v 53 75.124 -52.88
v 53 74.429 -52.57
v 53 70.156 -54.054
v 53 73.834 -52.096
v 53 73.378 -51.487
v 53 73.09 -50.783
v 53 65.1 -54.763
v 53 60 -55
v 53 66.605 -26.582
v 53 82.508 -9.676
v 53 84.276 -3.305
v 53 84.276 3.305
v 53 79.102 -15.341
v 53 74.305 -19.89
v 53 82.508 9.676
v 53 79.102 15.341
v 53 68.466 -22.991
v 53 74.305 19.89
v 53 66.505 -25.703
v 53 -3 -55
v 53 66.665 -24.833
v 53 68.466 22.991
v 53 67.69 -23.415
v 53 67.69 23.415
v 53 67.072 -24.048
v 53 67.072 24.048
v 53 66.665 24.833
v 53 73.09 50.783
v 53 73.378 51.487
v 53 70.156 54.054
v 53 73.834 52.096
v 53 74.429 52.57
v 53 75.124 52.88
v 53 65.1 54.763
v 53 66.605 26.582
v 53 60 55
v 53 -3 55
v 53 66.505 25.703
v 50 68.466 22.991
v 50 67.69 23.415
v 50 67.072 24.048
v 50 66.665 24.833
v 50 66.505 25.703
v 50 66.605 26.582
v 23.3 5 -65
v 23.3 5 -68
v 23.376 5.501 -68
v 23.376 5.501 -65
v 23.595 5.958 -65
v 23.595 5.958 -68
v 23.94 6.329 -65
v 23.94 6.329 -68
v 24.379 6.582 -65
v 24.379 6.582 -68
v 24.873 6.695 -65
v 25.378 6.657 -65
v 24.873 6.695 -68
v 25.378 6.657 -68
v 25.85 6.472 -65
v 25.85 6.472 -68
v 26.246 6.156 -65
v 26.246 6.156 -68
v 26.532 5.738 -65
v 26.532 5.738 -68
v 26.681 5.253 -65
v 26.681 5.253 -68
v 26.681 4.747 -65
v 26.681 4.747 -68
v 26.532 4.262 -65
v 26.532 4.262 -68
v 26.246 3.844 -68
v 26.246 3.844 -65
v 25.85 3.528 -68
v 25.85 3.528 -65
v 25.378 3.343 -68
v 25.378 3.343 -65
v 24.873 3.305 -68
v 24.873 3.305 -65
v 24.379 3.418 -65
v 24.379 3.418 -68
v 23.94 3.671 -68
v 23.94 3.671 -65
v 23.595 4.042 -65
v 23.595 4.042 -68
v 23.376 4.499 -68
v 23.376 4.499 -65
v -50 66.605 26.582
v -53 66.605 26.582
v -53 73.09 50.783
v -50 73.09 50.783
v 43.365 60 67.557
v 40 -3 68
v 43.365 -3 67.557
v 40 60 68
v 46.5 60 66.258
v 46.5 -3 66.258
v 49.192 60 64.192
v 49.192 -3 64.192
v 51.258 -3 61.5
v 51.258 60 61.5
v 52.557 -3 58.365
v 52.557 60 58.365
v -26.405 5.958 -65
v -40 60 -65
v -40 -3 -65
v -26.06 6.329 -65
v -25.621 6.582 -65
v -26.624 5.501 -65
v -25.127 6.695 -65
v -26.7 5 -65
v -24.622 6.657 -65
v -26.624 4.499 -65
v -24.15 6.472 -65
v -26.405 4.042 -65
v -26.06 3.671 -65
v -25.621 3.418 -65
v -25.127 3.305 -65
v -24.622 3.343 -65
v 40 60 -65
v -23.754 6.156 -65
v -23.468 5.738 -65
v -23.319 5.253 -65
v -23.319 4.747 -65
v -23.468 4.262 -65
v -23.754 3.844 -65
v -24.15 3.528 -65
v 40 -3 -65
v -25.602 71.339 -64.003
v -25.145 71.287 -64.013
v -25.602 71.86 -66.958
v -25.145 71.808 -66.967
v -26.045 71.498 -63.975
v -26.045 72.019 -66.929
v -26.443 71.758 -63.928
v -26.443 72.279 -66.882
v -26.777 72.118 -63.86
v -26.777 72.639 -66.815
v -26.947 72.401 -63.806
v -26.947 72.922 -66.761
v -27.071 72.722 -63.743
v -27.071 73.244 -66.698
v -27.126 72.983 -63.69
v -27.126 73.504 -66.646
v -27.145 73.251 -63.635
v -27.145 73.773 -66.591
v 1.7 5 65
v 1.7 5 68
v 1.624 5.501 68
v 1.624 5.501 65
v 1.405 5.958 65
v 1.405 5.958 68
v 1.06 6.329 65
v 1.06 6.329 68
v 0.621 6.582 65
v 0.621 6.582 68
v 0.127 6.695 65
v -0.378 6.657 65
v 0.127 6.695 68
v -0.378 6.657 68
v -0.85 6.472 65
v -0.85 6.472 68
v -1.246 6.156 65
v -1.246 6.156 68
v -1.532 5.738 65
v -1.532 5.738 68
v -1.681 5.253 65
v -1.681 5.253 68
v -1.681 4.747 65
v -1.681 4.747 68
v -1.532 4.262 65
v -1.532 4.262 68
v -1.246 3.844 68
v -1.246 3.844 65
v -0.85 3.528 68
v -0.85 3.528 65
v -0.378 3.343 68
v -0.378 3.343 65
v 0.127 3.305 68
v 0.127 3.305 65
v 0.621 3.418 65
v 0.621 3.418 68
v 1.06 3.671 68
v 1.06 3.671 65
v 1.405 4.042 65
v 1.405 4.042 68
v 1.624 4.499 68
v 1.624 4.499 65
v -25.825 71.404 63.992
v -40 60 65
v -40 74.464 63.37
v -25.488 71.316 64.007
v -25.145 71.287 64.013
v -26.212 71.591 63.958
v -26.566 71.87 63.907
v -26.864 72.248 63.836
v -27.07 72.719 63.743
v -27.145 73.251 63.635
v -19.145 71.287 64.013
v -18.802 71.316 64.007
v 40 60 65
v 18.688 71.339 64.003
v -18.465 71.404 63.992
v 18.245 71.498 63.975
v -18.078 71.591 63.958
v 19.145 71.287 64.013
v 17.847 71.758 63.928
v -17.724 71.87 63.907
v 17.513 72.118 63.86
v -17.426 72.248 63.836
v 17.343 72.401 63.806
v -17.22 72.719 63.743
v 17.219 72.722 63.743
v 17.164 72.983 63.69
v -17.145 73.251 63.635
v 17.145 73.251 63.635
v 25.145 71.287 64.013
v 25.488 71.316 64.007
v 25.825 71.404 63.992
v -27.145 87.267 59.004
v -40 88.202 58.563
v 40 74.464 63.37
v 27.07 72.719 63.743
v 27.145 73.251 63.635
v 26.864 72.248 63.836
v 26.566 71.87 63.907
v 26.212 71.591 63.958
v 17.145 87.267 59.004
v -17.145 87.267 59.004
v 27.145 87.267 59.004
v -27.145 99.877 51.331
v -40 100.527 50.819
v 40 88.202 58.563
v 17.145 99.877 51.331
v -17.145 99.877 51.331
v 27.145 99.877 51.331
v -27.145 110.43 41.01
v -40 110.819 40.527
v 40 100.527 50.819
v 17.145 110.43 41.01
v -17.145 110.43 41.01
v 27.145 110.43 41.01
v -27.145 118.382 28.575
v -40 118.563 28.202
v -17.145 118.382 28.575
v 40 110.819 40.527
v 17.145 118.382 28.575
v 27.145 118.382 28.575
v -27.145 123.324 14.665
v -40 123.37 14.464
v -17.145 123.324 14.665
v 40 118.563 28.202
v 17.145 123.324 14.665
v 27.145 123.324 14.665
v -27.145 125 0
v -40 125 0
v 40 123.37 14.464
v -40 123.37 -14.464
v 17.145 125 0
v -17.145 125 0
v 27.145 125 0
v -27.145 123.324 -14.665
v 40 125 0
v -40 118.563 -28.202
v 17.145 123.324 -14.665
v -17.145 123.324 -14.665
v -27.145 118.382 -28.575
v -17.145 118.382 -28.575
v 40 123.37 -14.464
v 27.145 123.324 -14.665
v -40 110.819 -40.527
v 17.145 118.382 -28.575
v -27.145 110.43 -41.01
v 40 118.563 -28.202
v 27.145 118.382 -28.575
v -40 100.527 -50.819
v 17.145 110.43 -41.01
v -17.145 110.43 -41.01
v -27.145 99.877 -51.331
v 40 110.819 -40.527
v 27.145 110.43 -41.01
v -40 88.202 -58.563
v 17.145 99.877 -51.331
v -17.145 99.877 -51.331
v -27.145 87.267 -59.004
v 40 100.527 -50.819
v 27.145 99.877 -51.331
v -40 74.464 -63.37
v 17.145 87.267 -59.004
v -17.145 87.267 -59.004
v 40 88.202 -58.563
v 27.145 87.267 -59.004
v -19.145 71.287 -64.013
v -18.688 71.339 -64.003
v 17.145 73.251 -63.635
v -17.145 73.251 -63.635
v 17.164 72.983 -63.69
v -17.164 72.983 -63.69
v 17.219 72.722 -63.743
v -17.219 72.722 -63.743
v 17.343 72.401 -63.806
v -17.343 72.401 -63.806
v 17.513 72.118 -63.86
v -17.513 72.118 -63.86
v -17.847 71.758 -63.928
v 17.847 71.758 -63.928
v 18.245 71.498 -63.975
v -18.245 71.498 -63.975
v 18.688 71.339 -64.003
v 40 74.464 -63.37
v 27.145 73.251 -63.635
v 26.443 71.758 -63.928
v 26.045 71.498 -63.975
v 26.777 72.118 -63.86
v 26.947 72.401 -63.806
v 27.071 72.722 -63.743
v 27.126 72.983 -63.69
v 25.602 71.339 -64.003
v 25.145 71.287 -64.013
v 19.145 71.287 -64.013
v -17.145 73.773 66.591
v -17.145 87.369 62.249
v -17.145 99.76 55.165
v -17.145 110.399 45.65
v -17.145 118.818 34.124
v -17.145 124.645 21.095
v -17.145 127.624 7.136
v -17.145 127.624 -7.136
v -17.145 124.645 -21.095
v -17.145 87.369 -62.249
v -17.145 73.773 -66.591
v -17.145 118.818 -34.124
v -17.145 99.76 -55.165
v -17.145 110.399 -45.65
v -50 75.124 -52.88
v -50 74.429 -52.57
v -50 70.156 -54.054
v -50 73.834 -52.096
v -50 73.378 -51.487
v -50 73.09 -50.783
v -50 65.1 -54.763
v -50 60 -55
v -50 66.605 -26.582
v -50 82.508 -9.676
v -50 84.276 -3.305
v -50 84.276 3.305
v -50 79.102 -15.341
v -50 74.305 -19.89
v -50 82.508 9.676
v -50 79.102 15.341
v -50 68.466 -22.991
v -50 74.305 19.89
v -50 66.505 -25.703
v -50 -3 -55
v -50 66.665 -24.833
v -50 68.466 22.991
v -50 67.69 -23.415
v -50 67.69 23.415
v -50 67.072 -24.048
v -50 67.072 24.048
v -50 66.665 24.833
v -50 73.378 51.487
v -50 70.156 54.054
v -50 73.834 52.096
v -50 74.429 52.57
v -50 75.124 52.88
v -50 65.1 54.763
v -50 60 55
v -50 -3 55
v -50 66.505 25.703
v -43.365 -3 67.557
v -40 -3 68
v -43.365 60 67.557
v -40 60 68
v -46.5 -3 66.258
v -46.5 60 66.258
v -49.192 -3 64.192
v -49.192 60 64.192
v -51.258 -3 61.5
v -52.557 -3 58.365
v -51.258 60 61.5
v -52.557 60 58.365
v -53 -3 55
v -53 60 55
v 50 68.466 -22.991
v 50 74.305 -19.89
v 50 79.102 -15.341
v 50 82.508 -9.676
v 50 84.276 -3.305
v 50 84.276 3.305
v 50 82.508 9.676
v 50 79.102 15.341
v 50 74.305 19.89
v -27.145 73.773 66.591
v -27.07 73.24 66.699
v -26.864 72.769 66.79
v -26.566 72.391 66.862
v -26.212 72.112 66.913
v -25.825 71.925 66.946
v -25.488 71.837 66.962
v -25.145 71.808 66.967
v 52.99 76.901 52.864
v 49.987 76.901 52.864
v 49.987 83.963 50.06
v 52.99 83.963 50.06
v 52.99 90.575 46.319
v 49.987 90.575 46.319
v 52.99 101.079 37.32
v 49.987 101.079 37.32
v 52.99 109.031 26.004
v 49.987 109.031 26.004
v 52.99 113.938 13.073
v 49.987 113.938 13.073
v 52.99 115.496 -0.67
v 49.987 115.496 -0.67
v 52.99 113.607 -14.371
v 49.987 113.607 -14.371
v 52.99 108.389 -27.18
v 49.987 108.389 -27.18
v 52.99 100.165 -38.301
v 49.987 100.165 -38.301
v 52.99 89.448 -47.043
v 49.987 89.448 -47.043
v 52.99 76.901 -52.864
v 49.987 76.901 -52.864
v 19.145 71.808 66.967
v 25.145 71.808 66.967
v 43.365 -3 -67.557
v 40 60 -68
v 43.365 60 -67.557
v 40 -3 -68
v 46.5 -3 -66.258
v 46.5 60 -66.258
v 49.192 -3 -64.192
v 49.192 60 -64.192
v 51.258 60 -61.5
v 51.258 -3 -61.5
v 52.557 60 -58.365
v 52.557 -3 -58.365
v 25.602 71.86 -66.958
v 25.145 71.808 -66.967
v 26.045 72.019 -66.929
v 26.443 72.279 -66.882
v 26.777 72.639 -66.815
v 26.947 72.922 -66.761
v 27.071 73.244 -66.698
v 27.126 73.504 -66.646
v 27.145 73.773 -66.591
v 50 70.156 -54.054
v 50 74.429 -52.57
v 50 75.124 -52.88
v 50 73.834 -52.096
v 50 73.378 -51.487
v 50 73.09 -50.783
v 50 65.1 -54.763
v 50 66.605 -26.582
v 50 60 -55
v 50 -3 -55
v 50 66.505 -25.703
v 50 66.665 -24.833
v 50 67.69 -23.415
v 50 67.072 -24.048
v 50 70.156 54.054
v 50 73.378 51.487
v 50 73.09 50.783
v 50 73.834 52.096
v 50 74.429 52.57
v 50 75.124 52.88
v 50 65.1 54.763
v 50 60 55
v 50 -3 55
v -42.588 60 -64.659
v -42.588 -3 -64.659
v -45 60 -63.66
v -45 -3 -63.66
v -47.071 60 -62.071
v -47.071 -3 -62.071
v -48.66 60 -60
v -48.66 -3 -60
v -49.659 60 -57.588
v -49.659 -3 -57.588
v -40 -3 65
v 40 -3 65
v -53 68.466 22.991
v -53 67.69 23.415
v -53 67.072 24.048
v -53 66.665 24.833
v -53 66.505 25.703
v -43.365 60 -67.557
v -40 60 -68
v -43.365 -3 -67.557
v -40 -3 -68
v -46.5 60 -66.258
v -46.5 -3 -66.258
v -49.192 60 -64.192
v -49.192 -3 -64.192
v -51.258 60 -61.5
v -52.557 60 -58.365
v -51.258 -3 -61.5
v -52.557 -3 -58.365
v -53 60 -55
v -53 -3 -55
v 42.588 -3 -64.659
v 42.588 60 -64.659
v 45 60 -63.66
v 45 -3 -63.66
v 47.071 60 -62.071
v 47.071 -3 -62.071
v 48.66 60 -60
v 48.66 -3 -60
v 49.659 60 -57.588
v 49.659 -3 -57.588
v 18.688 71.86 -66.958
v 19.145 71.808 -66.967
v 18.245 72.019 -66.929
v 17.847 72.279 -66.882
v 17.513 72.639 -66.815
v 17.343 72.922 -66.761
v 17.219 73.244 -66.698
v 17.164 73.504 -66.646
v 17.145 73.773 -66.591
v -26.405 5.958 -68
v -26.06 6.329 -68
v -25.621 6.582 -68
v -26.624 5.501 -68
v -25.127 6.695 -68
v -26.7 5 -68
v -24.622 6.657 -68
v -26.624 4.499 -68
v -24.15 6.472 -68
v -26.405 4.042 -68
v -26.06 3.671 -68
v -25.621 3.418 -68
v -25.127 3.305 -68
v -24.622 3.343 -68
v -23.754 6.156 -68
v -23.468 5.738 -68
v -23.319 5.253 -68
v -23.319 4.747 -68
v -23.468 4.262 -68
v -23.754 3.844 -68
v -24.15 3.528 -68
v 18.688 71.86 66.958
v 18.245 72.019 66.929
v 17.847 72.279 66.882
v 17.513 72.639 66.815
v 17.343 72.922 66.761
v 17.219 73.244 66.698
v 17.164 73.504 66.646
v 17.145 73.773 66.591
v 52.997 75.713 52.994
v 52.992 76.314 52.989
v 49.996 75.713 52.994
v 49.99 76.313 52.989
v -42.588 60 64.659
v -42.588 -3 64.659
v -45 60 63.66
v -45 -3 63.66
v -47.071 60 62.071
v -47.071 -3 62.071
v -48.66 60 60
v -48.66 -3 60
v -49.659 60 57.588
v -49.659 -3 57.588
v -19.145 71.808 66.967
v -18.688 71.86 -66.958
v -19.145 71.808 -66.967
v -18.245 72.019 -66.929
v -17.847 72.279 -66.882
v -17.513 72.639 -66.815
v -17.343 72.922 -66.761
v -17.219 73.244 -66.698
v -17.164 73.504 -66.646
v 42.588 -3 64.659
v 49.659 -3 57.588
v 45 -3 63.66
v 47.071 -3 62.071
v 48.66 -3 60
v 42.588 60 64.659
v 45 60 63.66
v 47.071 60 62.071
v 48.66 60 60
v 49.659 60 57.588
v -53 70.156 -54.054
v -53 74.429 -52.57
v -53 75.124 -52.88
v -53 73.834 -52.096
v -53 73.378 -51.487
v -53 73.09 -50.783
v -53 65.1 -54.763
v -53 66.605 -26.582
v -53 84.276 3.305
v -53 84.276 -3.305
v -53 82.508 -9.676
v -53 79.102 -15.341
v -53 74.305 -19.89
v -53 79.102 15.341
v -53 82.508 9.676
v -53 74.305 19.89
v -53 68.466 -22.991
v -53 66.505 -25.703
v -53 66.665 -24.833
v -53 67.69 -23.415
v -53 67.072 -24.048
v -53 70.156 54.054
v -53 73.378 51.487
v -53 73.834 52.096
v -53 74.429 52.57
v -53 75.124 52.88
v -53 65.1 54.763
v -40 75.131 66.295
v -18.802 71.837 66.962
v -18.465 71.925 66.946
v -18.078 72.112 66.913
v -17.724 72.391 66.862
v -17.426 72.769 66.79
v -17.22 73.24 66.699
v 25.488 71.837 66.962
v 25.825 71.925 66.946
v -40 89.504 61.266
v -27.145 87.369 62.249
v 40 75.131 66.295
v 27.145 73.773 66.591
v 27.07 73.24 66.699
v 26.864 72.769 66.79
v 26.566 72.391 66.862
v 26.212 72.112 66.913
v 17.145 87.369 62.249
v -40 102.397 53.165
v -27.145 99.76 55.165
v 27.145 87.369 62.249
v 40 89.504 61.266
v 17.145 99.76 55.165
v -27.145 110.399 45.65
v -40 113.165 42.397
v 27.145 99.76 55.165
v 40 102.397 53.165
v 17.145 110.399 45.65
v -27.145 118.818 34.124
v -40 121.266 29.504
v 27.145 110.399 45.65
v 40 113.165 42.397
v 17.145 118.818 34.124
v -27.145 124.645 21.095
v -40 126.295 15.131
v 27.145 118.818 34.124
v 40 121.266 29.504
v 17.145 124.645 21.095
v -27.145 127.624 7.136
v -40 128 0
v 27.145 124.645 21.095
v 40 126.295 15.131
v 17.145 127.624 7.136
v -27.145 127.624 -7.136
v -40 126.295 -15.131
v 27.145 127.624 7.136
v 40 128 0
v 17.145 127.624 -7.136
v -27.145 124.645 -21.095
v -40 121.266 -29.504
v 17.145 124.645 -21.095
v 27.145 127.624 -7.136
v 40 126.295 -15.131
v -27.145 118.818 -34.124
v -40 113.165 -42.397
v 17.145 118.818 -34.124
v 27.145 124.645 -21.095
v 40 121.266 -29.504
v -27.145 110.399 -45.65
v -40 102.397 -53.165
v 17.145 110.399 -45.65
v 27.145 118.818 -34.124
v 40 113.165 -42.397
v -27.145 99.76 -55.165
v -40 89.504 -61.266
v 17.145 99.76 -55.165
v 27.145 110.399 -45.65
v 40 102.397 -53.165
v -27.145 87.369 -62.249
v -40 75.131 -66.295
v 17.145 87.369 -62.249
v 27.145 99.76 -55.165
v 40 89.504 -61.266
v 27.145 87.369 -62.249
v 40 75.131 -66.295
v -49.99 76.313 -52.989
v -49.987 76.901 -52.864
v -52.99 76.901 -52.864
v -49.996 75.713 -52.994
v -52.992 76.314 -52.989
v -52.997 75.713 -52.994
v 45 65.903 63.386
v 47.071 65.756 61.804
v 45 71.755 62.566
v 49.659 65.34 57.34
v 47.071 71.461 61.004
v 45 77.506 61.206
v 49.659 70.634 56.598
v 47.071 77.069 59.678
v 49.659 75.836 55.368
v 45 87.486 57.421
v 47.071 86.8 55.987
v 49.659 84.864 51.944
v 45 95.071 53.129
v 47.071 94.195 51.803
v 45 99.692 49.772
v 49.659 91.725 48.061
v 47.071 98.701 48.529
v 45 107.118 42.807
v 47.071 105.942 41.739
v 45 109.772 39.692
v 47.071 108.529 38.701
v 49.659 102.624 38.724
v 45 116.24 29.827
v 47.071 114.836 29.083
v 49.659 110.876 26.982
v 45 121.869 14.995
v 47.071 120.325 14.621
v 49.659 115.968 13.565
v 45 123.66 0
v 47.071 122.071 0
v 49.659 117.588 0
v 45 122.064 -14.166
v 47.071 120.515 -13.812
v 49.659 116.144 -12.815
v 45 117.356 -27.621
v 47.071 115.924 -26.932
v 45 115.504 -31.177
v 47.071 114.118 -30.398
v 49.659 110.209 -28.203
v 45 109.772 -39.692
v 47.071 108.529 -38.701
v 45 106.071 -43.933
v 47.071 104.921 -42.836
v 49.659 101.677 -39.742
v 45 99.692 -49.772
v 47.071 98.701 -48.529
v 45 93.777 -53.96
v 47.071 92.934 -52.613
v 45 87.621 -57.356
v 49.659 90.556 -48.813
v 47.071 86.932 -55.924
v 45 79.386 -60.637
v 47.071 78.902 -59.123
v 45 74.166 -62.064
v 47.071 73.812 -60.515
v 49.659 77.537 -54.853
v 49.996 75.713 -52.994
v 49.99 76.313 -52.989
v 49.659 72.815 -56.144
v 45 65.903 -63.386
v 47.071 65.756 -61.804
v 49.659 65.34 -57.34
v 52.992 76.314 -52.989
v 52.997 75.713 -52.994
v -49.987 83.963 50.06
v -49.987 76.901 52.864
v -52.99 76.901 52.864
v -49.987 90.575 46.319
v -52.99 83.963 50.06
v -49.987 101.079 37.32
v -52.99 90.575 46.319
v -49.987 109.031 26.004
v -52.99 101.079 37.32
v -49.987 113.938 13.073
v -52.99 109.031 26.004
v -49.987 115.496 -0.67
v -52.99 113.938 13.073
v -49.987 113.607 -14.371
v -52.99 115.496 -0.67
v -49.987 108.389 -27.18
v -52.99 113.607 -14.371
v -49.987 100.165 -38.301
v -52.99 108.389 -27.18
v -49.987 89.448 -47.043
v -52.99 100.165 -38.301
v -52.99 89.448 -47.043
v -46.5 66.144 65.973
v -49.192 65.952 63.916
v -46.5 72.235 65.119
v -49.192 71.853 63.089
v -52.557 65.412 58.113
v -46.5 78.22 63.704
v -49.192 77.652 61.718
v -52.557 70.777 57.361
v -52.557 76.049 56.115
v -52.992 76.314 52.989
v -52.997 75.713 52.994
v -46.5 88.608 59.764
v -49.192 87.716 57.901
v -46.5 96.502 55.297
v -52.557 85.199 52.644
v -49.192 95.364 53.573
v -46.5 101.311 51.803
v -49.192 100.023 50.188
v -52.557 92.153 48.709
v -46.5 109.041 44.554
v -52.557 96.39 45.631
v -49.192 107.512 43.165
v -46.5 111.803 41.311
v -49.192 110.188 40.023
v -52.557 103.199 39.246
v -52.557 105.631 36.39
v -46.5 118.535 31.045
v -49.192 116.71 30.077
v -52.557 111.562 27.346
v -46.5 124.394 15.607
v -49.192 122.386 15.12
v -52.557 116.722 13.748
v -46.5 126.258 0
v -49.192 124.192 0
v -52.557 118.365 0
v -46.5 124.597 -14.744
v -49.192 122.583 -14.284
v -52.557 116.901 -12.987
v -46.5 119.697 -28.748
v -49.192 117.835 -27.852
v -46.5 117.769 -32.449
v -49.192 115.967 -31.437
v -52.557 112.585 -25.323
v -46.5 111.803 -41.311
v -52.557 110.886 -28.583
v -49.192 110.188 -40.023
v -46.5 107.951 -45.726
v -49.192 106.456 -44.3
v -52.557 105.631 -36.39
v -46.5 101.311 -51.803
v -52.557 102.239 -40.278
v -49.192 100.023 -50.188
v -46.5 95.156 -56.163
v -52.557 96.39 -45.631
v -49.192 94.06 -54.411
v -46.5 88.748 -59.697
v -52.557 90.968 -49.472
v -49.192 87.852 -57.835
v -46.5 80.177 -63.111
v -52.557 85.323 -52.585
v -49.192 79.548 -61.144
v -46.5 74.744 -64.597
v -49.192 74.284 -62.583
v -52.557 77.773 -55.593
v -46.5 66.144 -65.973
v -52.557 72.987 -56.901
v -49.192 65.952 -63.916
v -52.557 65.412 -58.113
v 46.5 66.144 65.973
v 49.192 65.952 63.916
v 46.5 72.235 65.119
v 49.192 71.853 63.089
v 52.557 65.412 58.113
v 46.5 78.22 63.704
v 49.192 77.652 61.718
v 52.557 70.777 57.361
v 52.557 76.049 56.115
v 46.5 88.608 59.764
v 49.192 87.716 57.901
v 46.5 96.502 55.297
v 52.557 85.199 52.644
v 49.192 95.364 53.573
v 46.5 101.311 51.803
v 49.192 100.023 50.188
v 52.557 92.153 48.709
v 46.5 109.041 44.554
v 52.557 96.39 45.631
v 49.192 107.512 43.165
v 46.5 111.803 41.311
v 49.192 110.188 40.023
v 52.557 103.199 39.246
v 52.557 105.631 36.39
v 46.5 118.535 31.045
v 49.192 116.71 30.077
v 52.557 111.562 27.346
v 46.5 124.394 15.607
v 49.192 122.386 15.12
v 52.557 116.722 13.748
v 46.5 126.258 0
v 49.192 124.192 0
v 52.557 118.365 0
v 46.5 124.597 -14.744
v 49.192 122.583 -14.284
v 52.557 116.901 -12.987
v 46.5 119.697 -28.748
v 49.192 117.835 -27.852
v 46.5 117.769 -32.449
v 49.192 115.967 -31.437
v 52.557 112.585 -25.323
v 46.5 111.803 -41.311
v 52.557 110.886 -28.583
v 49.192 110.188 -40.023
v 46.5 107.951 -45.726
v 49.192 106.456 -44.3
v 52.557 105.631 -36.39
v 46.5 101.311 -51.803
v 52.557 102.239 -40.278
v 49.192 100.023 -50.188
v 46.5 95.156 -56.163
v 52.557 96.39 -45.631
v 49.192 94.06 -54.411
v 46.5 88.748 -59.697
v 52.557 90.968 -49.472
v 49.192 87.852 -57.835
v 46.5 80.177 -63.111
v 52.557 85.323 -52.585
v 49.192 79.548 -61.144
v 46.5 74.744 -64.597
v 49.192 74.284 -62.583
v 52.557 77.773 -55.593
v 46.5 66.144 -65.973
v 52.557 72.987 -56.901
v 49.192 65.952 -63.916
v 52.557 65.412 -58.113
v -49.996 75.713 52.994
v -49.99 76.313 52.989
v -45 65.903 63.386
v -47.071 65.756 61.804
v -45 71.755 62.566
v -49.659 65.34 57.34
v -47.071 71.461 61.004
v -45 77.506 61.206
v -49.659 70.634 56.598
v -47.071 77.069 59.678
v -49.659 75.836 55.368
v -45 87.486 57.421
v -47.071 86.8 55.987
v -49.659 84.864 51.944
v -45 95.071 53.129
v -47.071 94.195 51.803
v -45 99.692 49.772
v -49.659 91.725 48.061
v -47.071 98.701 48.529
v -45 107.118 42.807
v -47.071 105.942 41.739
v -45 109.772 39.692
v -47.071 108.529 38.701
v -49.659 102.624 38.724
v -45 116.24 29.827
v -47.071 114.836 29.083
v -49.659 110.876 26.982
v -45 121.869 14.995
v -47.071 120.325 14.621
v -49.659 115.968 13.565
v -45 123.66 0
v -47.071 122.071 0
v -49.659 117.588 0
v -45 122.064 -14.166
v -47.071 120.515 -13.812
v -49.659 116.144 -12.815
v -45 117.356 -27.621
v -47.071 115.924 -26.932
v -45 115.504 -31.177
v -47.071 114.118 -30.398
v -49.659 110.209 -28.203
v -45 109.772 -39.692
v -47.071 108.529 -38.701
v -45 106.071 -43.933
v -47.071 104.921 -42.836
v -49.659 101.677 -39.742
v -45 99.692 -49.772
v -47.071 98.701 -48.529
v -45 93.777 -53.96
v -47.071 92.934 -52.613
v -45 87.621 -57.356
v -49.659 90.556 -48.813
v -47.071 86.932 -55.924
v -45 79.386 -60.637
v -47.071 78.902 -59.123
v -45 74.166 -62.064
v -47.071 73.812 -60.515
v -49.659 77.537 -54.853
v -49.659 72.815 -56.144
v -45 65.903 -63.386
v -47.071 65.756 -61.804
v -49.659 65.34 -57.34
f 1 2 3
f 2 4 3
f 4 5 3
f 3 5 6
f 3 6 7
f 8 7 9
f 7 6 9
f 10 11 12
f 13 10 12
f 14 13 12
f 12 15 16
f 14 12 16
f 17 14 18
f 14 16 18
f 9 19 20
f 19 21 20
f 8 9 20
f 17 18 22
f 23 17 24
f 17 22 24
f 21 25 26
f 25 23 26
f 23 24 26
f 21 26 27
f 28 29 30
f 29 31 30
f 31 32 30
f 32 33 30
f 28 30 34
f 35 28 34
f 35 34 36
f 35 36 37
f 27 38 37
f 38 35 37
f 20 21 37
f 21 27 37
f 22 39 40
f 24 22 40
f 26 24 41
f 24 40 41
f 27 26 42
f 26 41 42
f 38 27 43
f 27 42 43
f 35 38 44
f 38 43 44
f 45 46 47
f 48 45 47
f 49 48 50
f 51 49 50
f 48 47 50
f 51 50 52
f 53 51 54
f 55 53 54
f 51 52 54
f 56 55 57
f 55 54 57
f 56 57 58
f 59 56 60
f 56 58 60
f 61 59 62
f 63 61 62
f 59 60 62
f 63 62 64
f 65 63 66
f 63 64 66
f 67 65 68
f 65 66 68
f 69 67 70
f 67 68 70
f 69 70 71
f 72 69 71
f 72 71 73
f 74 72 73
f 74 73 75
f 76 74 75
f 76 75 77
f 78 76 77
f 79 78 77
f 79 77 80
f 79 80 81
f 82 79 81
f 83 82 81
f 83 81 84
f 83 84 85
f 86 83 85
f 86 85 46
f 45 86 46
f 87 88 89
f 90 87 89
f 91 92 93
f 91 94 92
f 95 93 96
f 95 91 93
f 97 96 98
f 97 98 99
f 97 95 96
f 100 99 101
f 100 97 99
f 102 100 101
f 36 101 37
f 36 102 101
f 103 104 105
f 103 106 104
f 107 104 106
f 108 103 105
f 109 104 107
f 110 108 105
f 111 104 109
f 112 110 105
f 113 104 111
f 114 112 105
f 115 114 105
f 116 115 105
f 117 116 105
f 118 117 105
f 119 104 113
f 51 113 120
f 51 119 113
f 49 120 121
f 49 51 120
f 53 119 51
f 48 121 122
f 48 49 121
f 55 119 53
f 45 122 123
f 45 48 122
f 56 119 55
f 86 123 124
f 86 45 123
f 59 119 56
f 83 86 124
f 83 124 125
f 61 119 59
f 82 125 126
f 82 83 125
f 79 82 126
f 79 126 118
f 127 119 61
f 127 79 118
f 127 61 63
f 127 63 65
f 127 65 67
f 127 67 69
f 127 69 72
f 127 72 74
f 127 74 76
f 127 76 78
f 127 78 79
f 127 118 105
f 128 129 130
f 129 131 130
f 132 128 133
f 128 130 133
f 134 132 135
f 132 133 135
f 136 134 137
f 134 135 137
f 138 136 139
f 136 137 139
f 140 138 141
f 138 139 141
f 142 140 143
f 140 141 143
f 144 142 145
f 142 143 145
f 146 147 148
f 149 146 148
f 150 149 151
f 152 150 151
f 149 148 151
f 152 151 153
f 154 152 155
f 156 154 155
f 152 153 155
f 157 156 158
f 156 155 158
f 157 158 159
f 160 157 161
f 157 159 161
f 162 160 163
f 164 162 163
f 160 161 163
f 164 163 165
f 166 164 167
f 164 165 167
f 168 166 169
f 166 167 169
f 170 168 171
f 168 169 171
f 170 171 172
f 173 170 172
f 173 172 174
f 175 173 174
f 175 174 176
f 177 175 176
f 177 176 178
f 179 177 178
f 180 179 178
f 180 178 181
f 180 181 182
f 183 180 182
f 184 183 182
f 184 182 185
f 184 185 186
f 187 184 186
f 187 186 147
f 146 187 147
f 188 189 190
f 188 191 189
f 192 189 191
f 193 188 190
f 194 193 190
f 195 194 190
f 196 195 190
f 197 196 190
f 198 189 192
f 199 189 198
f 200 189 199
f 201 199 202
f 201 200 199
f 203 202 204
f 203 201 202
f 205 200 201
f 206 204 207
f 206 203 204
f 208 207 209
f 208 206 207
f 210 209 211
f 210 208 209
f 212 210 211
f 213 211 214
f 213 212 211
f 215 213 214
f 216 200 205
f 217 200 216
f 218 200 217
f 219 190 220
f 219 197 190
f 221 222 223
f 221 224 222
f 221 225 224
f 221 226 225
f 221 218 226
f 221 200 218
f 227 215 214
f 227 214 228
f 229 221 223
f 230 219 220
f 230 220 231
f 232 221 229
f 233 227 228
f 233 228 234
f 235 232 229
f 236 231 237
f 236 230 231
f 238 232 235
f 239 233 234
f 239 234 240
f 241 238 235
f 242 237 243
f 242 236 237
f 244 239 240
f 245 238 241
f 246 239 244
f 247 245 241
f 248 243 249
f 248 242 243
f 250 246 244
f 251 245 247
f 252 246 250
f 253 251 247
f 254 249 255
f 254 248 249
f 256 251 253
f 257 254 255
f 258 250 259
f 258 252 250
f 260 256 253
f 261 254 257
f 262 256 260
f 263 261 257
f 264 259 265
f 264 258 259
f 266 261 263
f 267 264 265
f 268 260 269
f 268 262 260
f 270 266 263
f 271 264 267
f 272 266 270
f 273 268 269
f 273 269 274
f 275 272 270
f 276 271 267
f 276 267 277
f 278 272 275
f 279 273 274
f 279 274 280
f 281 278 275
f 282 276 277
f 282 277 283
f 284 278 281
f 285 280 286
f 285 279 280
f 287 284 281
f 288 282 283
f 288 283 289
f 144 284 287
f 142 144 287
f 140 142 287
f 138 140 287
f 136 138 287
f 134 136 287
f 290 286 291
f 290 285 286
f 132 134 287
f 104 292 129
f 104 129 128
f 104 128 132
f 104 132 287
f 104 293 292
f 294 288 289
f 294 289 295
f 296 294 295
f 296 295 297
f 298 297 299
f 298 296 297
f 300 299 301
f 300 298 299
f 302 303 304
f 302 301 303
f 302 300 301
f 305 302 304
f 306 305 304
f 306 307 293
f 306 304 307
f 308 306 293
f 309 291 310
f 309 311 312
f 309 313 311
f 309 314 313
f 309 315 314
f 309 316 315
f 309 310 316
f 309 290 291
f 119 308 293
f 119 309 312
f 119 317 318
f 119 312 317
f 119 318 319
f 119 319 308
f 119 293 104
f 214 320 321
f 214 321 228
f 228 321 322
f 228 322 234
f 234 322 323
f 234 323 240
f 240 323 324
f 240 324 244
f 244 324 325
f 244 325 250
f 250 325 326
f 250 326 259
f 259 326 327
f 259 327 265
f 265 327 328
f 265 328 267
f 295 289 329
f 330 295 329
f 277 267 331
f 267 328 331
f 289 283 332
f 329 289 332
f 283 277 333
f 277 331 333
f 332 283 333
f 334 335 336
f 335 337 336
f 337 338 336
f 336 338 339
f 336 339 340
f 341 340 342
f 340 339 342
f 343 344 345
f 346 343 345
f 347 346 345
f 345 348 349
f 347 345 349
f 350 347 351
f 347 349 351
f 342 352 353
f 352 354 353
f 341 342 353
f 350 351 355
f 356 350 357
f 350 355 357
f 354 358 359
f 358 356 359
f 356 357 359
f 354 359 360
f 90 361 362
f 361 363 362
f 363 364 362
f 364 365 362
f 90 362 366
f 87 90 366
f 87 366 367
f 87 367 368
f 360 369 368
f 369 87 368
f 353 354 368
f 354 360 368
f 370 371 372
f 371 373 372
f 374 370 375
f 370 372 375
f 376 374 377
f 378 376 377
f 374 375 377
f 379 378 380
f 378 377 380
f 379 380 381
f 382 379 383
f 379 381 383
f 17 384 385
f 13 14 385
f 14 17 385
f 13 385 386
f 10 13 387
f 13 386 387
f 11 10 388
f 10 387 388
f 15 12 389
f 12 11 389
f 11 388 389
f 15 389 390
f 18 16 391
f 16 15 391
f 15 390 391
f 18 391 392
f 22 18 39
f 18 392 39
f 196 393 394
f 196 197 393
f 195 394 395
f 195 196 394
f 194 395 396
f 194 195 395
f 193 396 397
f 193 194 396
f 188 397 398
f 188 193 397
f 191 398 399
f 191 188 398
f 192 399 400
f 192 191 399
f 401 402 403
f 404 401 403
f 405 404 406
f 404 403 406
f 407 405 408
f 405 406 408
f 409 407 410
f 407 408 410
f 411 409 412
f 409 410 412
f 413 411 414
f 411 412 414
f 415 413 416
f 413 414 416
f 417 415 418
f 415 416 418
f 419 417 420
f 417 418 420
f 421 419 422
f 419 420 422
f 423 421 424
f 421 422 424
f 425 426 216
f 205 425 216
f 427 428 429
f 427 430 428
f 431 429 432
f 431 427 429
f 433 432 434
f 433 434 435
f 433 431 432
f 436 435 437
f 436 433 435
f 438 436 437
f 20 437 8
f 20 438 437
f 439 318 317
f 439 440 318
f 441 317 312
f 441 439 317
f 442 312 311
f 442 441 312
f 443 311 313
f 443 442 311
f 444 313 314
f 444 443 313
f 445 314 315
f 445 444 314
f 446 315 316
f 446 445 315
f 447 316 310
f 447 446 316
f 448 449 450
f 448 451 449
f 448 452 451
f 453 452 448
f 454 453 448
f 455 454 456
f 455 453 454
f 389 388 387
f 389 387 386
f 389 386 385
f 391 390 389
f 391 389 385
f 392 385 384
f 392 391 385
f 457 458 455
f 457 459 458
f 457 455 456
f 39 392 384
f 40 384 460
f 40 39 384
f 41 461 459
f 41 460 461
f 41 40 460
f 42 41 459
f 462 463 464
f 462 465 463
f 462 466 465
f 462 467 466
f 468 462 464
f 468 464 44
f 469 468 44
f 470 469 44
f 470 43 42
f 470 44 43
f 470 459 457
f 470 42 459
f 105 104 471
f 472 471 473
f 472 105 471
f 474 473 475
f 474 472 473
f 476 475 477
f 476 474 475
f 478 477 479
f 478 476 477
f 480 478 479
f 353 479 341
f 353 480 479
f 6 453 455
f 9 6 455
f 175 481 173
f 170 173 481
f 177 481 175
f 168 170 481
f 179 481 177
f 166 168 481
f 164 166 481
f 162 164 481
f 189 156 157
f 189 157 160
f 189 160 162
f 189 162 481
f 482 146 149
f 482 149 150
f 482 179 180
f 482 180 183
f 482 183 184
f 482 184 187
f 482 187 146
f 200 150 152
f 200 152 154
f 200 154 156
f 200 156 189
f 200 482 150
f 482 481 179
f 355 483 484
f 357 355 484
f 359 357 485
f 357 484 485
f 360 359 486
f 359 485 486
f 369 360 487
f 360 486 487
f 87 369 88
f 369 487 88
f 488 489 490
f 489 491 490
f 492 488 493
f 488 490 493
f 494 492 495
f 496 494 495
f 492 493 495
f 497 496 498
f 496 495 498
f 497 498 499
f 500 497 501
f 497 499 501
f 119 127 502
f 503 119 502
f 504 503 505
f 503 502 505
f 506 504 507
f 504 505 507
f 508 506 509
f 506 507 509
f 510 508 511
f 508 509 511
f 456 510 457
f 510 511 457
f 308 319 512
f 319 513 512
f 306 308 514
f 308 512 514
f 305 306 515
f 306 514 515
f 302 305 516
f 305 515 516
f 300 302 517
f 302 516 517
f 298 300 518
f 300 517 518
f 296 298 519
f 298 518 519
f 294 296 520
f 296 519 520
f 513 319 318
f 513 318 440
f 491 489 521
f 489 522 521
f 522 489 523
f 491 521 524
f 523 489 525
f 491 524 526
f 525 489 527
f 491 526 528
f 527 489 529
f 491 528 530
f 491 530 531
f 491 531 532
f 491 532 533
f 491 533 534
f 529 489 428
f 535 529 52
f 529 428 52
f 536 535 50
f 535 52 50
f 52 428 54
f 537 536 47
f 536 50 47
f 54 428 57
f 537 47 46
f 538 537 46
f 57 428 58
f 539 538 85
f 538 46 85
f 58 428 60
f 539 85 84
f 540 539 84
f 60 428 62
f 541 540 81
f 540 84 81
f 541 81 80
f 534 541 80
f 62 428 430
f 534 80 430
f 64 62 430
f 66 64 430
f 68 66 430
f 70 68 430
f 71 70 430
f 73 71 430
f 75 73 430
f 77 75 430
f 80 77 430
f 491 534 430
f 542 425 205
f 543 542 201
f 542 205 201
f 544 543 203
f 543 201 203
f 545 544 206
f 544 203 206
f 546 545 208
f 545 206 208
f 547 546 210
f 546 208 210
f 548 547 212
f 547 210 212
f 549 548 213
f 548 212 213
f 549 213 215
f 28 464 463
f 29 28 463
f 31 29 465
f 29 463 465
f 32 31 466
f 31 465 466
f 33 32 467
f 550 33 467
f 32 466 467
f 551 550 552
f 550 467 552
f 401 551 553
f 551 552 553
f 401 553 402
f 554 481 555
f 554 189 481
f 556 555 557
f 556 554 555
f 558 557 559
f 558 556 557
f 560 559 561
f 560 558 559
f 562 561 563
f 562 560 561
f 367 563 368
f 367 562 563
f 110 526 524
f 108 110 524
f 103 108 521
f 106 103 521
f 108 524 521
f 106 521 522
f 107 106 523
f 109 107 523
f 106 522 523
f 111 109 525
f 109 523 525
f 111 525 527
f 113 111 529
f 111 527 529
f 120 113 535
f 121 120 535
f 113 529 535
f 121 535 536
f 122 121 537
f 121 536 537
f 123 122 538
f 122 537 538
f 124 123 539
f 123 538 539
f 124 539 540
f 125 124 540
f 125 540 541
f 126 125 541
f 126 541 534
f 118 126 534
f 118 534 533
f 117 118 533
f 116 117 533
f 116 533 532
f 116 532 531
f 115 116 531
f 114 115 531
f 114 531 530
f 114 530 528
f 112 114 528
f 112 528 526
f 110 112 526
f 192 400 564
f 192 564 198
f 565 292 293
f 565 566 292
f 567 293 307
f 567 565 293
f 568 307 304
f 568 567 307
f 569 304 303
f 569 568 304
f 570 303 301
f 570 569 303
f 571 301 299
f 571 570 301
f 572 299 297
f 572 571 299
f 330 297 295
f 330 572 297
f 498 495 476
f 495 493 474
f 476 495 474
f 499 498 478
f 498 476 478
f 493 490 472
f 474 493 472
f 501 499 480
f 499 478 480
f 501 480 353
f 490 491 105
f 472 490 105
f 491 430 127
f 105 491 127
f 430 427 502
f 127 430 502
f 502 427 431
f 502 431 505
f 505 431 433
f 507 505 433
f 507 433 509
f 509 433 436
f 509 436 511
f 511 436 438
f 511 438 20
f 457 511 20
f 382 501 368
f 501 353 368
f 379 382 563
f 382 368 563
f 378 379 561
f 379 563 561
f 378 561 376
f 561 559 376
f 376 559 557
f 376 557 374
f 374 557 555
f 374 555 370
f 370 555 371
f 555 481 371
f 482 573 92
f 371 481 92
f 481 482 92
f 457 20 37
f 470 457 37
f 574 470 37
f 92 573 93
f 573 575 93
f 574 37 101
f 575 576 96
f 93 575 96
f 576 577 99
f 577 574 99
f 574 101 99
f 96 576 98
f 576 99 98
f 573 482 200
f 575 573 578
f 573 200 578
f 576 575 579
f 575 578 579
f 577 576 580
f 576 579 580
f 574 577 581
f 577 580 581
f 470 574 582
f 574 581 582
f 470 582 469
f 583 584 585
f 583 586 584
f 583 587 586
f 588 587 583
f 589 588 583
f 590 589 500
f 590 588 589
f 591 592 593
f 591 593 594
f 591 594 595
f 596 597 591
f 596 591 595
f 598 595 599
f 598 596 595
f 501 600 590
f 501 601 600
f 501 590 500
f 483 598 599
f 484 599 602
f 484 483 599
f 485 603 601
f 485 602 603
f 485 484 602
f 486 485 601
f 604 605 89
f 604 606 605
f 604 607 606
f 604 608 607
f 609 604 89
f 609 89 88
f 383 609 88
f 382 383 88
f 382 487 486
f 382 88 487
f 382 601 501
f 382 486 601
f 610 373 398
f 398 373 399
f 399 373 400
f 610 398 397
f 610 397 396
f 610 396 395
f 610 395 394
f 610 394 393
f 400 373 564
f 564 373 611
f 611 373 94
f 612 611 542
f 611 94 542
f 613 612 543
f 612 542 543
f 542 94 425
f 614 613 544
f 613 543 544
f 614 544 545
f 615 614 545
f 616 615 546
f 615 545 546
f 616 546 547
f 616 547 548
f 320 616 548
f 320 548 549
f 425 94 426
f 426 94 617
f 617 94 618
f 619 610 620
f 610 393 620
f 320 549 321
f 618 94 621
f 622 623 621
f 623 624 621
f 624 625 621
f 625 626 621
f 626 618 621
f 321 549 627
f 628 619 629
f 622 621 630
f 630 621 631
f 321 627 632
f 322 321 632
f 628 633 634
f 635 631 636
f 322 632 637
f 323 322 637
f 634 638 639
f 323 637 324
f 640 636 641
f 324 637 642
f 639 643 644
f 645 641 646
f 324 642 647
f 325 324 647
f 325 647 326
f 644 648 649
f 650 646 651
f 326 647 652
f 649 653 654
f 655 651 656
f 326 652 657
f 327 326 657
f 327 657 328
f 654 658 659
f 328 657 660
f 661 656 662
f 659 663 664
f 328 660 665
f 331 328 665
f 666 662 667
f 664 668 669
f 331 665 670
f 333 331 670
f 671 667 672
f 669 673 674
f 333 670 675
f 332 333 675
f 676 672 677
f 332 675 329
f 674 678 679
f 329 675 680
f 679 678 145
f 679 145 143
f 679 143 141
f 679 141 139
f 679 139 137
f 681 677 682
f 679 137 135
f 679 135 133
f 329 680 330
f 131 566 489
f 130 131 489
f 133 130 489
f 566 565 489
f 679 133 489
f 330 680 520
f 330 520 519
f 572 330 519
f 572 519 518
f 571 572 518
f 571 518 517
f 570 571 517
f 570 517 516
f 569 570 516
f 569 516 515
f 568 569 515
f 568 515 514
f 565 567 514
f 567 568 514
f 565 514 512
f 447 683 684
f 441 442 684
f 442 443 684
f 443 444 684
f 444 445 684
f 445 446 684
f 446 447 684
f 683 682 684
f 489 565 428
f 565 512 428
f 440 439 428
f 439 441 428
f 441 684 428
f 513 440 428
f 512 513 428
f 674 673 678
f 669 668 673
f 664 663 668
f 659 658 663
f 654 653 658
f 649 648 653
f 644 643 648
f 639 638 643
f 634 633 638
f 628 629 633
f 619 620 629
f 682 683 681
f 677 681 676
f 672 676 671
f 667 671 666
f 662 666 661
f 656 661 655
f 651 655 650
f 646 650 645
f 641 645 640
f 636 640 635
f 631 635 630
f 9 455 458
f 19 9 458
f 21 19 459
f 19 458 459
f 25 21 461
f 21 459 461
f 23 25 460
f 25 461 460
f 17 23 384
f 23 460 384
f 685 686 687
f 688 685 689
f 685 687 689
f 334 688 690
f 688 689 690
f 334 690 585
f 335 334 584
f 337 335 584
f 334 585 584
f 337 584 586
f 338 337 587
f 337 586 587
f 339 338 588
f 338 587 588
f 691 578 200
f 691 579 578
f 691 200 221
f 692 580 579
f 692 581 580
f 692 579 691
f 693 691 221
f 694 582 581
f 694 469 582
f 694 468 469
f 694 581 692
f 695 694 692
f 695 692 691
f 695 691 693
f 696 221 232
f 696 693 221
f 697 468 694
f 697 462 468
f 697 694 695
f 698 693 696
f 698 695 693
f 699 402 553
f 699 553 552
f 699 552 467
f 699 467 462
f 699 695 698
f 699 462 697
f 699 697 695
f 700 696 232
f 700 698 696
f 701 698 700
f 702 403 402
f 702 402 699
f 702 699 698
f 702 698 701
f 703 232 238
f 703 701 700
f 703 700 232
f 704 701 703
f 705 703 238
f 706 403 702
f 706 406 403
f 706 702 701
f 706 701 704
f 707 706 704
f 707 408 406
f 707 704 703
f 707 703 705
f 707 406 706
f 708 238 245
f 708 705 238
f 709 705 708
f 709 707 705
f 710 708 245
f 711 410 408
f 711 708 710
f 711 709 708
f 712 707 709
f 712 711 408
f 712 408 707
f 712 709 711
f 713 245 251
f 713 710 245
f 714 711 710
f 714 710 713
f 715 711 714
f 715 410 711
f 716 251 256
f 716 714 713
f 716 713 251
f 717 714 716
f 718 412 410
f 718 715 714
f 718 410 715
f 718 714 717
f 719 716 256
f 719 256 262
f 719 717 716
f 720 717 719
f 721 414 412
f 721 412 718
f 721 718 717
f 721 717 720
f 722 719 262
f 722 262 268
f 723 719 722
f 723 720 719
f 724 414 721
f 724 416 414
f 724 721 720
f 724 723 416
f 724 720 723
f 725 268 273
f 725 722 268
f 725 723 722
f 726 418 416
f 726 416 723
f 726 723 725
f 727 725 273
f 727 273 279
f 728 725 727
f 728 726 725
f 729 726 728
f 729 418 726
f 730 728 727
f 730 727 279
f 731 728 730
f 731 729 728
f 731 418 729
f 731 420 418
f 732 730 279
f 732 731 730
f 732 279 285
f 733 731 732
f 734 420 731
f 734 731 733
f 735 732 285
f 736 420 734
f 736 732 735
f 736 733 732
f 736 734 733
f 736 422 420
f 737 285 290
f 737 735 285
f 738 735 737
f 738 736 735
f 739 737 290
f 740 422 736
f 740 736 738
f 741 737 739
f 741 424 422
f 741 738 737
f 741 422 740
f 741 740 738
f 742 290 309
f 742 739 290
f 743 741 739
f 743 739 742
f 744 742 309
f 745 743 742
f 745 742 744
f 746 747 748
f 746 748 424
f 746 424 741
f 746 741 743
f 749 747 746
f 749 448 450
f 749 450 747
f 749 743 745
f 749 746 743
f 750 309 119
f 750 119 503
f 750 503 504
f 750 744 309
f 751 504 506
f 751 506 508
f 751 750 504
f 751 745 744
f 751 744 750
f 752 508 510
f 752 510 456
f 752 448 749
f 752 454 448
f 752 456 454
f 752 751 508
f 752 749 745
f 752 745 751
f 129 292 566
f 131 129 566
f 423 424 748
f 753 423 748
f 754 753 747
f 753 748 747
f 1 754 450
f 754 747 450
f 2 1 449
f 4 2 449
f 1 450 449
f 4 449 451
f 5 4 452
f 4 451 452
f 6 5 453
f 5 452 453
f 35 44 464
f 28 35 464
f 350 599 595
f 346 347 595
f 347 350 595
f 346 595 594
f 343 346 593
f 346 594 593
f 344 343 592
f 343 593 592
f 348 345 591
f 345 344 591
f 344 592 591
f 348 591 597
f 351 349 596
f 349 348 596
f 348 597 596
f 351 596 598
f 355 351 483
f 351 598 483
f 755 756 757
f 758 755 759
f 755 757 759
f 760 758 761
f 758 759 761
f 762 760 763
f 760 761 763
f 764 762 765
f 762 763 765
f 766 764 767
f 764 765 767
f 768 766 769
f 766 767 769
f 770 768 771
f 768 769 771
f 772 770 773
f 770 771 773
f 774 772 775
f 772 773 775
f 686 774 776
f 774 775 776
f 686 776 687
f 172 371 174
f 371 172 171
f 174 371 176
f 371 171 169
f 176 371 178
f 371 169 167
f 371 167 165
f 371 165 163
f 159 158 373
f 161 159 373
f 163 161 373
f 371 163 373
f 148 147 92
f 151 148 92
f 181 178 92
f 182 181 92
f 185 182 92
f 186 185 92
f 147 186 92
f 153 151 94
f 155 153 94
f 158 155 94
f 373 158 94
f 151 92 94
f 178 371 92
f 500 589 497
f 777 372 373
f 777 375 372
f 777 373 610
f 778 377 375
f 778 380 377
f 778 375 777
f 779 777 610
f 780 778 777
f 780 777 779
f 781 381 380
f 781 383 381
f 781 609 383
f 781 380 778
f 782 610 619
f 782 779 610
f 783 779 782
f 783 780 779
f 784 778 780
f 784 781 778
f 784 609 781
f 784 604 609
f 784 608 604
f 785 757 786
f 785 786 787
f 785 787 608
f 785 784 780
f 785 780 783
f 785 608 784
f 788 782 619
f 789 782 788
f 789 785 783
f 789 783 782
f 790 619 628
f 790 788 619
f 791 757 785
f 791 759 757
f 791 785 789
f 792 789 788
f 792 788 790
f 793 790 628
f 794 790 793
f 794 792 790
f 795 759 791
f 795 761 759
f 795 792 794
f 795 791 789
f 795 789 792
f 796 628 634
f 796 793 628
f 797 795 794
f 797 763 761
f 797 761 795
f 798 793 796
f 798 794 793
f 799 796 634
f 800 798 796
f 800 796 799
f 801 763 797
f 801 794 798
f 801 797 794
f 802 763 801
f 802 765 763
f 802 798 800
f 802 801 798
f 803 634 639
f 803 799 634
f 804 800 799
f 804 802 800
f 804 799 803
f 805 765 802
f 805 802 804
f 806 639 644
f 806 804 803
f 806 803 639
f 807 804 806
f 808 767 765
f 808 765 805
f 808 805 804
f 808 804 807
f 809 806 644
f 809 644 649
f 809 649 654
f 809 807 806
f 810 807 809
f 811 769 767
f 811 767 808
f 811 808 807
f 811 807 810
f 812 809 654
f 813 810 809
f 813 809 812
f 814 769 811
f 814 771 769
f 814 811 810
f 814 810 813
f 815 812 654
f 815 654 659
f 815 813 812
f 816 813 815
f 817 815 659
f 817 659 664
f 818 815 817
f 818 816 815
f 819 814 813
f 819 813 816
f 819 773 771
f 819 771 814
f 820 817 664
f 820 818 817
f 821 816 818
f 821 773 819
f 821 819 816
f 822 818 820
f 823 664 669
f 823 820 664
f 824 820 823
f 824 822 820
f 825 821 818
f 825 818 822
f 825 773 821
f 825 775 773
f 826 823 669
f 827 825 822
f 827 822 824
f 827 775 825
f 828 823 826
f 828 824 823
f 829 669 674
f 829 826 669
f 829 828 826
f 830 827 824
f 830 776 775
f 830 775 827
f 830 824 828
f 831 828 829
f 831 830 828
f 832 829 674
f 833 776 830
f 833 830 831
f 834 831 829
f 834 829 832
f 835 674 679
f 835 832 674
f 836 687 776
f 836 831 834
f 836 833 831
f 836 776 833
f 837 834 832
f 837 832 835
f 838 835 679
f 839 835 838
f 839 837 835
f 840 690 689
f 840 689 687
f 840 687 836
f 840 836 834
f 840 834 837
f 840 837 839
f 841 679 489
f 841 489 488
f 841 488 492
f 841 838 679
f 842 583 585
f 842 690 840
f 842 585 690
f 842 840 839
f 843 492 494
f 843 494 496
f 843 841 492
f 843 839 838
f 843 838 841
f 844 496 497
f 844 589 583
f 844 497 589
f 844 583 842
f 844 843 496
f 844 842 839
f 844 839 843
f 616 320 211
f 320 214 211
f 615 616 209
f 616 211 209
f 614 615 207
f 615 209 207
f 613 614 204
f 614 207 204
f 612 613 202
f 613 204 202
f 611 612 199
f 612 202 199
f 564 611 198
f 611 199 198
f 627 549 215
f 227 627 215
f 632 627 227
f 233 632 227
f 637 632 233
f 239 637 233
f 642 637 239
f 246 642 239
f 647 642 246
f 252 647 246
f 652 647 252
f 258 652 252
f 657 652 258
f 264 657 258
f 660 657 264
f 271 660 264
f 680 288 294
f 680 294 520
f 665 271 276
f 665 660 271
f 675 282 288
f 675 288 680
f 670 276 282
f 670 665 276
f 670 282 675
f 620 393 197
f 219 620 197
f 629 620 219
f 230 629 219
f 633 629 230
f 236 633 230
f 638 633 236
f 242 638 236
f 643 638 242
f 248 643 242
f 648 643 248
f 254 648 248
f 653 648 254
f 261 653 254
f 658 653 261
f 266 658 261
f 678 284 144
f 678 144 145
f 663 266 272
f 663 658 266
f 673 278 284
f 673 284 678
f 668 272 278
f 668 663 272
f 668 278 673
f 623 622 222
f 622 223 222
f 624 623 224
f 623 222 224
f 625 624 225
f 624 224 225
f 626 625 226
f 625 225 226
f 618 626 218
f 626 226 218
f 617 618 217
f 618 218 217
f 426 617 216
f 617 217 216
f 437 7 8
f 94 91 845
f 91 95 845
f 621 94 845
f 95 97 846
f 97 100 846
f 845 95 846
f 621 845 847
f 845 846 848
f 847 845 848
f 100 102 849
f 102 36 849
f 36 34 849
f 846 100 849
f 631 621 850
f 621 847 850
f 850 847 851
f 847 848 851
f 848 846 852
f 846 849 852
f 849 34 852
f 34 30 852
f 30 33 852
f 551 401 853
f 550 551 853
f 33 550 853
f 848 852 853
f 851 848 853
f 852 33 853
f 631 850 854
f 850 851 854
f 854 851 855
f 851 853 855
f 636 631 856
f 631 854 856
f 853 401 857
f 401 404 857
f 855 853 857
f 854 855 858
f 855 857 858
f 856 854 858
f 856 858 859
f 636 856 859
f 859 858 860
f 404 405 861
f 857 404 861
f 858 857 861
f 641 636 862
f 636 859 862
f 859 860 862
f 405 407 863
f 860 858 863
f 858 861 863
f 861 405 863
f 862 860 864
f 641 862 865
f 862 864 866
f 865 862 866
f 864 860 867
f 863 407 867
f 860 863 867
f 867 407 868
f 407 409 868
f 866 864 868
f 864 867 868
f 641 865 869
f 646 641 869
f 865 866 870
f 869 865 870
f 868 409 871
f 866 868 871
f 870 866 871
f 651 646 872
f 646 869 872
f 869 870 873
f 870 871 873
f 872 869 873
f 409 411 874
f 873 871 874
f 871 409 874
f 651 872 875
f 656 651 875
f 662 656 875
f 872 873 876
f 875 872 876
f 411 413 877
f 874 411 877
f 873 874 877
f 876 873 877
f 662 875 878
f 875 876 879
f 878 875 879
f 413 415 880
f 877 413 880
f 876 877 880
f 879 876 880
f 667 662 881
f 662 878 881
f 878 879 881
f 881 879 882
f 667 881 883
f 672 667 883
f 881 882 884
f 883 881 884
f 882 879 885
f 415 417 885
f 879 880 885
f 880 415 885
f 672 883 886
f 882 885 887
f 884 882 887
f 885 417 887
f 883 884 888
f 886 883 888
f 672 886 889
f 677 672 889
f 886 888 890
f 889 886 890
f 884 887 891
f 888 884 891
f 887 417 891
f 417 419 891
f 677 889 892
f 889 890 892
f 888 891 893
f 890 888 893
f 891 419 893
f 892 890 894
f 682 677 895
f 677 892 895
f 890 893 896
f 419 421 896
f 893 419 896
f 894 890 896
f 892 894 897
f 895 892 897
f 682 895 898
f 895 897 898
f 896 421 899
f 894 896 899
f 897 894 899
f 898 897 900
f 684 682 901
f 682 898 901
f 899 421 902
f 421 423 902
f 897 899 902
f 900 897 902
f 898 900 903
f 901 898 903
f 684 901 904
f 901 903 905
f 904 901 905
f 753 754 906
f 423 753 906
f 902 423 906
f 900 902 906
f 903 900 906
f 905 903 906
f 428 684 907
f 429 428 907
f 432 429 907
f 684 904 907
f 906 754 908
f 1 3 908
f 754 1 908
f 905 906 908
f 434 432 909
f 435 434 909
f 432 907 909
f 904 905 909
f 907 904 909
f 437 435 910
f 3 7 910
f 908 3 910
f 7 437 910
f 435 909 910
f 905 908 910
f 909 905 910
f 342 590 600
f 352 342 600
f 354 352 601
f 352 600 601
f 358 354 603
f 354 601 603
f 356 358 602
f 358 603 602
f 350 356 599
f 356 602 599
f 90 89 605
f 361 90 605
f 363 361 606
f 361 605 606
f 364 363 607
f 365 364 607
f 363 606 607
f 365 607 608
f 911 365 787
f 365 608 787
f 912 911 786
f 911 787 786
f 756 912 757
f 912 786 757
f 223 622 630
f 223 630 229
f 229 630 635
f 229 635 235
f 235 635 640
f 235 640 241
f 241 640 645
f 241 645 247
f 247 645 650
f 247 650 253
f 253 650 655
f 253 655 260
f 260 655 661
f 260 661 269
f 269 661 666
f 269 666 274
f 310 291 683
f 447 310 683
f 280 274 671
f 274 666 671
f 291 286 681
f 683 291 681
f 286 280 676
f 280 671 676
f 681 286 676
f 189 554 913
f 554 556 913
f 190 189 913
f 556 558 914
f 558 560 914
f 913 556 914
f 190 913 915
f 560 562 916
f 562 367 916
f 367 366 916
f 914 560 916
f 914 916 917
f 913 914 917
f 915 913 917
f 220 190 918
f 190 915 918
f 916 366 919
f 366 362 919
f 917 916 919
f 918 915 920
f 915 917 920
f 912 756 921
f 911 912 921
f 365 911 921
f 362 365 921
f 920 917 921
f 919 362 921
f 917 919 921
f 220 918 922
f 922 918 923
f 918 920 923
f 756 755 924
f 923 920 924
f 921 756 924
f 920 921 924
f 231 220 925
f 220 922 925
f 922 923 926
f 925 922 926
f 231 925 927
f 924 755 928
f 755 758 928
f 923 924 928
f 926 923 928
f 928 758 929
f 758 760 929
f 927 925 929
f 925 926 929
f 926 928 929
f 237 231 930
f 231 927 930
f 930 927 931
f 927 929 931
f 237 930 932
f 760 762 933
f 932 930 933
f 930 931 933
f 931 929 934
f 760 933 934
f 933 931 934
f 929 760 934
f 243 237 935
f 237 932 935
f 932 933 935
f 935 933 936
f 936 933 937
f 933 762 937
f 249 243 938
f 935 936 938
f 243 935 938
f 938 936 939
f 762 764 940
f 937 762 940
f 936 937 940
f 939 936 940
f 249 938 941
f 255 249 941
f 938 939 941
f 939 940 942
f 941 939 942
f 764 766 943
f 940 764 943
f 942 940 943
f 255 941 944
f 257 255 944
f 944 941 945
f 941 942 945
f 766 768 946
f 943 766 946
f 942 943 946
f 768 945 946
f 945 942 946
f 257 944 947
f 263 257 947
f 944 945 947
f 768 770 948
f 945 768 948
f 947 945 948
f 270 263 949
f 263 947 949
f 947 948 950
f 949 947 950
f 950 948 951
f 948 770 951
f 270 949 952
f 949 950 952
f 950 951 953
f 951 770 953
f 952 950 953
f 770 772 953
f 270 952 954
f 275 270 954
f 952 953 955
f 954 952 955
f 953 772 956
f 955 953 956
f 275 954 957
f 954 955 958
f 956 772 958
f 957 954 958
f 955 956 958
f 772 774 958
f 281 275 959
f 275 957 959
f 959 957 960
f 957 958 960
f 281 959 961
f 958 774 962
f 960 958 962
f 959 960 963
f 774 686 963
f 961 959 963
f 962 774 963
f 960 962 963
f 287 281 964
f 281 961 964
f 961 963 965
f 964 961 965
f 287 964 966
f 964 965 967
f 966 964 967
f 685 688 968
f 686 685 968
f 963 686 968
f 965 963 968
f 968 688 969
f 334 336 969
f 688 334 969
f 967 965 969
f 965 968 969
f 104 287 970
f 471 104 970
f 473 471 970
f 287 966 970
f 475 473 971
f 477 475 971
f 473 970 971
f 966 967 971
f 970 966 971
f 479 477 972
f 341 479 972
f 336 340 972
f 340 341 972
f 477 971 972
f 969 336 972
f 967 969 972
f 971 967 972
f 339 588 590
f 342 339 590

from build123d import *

# Parameters (mm, degrees)
BOSS_EXTRUDE1_DEPTH      = 53
BOSS_EXTRUDE1_DEPTH_BACK = 53
FILLET1_R                = 13
SHELL1_T                 = -3
CUT_EXTRUDE1_DEPTH       = 155.32757377
CUT_EXTRUDE1_DEPTH_BACK  = 155.32757377
CUT_EXTRUDE2_START       = -22.145
CUT_EXTRUDE2_DEPTH       = 5
FILLET2_R                = 2
SKETCH4_R                = 1.7
CUT_EXTRUDE3_DEPTH       = 10
SKETCH5_R                = 1.7
CUT_EXTRUDE6_DEPTH       = 10


with BuildPart() as part:
    # Sketch1 → Boss-Extrude1 (new, two sides: drawn at the far end of the back side and taken through both)
    with BuildSketch(Plane(origin=(0, -21.232774713, 56.11), x_dir=(0, -1, 0), z_dir=(-1, 0, 0)).offset(-BOSS_EXTRUDE1_DEPTH_BACK)):
        with BuildLine():
            Line((-18.232774713, -124.11), (-18.232774713, 11.89))
            Line((-18.232774713, 11.89), (-81.232774713, 11.89))
            ThreePointArc((-81.232774713, 11.89), (-149.232774713, -56.11), (-81.232774713, -124.11))
            Line((-81.232774713, -124.11), (-18.232774713, -124.11))
        make_face()
    extrude(amount=BOSS_EXTRUDE1_DEPTH + BOSS_EXTRUDE1_DEPTH_BACK)

    # Fillet1
    fillet1_edges = [part.edges().sort_by_distance(p)[0] for p in [
        (53, 28.5, 68),
        (53, 128, 0),
        (53, 28.5, -68),
        (-53, 28.5, 68),
        (-53, 28.5, -68),
        (-53, 128, 0),
    ]]
    fillet(fillet1_edges, radius=FILLET1_R)

    # Shell1
    shell1_openings = [part.faces().sort_by_distance(p)[0] for p in [
        (0, -3, 0),
    ]]
    offset(amount=SHELL1_T, openings=shell1_openings, kind=Kind.INTERSECTION)

    # Sketch2 → Cut-Extrude1 (cut, two sides: drawn at the far end of the back side and taken through both)
    with BuildSketch(Plane(origin=(0, 0, 0), x_dir=(0, 0, -1), z_dir=(1, 0, 0)).offset(-CUT_EXTRUDE1_DEPTH_BACK)):
        with BuildLine():
            Line((-26.582377719, 66.605088553), (-50.782987187, 73.089622316))
            ThreePointArc((-50.782987187, 73.089622316), (-52.639593743, 74.549701775), (-52.864046055, 76.900965497))
            ThreePointArc((-52.864046055, 76.900965497), (0, 115.5), (52.864046055, 76.900965497))
            ThreePointArc((52.864046055, 76.900965497), (52.639593743, 74.549701775), (50.782987187, 73.089622316))
            Line((50.782987187, 73.089622316), (26.582377719, 66.605088553))
            ThreePointArc((26.582377719, 66.605088553), (24.425691005, 66.839228235), (22.990729248, 68.466189737))
            ThreePointArc((22.990729248, 68.466189737), (0, 84.5), (-22.990729248, 68.466189737))
            ThreePointArc((-22.990729248, 68.466189737), (-24.425691005, 66.839228235), (-26.582377719, 66.605088553))
        make_face()
    extrude(amount=CUT_EXTRUDE1_DEPTH + CUT_EXTRUDE1_DEPTH_BACK, mode=Mode.SUBTRACT)

    # Sketch3 → Cut-Extrude2 (cut, symmetric)
    with BuildSketch(Plane(origin=(0, 0, 0), x_dir=(0, 0, -1), z_dir=(1, 0, 0)).offset(CUT_EXTRUDE2_START)):
        with BuildLine():
            Line((0, 60), (98.480775301, 77.364817767))
            ThreePointArc((98.480775301, 77.364817767), (0, 160), (-98.480775301, 77.364817767))
            Line((-98.480775301, 77.364817767), (0, 60))
        make_face()
    cut_extrude2 = extrude(amount=CUT_EXTRUDE2_DEPTH, both=True, mode=Mode.SUBTRACT)

    # Mirror1: Cut-Extrude2 across plane
    add(cut_extrude2.mirror(Plane(origin=(0, 0, 0), x_dir=(0, 0, 1), z_dir=(1, 0, 0))), mode=Mode.SUBTRACT)

    # Fillet2
    fillet2_edges = [part.edges().sort_by_distance(p)[0] for p in [
        (-17.145, 71.547603815, 65.489715575),
        (-17.145, 71.547603815, -65.489715575),
        (-27.145, 71.547603815, -65.489715575),
        (-27.145, 71.547603815, 65.489715575),
        (27.145, 71.547603815, 65.489715575),
        (27.145, 71.547603815, -65.489715575),
        (17.145, 71.547603815, -65.489715575),
        (17.145, 71.547603815, 65.489715575),
    ]]
    fillet(fillet2_edges, radius=FILLET2_R)

    # Sketch4 → Cut-Extrude3 (cut)
    with BuildSketch(Plane.XY.offset(68)):
        with Locations((0, 5)):
            Circle(SKETCH4_R)
    extrude(amount=-CUT_EXTRUDE3_DEPTH, mode=Mode.SUBTRACT)

    # Sketch5 → Cut-Extrude6 (cut)
    with BuildSketch(Plane(origin=(0, 0, -68), x_dir=(-1, 0, 0), z_dir=(0, 0, -1))):
        with Locations((25, 5)):
            Circle(SKETCH5_R)
        with Locations((-25, 5)):
            Circle(SKETCH5_R)
    extrude(amount=-CUT_EXTRUDE6_DEPTH, mode=Mode.SUBTRACT)


solid = part.part
